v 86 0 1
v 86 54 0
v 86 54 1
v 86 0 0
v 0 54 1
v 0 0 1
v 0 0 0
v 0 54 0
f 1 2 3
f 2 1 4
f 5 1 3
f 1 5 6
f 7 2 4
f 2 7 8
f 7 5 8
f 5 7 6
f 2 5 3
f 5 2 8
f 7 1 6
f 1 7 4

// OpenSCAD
module card() {
    cardX = 86;
    cardY = 54;
    
    module roundedcube(x, y, z){
        cube([x, y, z]);
    }
    module chip() {
        color([0,0,0])
        translate([9, cardY - 18, 0])
        roundedcube(10, 9, 1);
    }
    module qrCode() {
        width = 40;
        height = 40;
        color([0, 0, 0])
        translate([cardX - width - 7, (cardY - height) / 2, 0])
        cube([width, height, 1]);
    }
    difference() {
        difference() {
            roundedcube(cardX, cardY, 1);
            translate([0, 0, -0.5]) resize([0, 0, 2]) chip();      
        }
        translate([0, 0, -0.5]) resize([0, 0, 2]) qrCode();
    } 
    
    chip();
    
    qrCode();
}

card();
